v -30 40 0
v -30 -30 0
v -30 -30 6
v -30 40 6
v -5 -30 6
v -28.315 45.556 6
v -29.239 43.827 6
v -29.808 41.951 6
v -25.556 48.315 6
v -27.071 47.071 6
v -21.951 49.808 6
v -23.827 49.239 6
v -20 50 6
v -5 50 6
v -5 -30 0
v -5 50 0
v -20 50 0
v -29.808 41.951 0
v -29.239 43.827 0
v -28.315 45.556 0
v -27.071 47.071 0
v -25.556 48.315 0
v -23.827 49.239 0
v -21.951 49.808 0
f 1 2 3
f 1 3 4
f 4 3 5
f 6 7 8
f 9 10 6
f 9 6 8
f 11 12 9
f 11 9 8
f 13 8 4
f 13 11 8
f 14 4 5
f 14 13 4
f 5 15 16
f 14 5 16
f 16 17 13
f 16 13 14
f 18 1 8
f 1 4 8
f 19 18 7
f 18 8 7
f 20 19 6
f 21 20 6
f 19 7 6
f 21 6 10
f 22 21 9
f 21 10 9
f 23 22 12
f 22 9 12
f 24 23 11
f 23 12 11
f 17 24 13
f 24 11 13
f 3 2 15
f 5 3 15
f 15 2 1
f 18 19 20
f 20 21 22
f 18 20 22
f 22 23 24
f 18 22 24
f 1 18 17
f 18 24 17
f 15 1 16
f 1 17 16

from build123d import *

# Parameters (mm, degrees)
ESQUISSE1_W      = 25
ESQUISSE1_H      = 80
EXTRUSION1_DEPTH = 6
CONG_1_R         = 10


with BuildPart() as part:
    # Esquisse1 → Extrusion1 (new body)
    with BuildSketch(Plane.XY):
        with Locations((-17.5, 10)):
            Rectangle(ESQUISSE1_W, ESQUISSE1_H)
    extrude(amount=EXTRUSION1_DEPTH)

    # Congé1
    cong_1_edges = [part.edges().sort_by_distance(p)[0] for p in [
        (-30, 50, 3),
    ]]
    fillet(cong_1_edges, radius=CONG_1_R)


solid = part.part
